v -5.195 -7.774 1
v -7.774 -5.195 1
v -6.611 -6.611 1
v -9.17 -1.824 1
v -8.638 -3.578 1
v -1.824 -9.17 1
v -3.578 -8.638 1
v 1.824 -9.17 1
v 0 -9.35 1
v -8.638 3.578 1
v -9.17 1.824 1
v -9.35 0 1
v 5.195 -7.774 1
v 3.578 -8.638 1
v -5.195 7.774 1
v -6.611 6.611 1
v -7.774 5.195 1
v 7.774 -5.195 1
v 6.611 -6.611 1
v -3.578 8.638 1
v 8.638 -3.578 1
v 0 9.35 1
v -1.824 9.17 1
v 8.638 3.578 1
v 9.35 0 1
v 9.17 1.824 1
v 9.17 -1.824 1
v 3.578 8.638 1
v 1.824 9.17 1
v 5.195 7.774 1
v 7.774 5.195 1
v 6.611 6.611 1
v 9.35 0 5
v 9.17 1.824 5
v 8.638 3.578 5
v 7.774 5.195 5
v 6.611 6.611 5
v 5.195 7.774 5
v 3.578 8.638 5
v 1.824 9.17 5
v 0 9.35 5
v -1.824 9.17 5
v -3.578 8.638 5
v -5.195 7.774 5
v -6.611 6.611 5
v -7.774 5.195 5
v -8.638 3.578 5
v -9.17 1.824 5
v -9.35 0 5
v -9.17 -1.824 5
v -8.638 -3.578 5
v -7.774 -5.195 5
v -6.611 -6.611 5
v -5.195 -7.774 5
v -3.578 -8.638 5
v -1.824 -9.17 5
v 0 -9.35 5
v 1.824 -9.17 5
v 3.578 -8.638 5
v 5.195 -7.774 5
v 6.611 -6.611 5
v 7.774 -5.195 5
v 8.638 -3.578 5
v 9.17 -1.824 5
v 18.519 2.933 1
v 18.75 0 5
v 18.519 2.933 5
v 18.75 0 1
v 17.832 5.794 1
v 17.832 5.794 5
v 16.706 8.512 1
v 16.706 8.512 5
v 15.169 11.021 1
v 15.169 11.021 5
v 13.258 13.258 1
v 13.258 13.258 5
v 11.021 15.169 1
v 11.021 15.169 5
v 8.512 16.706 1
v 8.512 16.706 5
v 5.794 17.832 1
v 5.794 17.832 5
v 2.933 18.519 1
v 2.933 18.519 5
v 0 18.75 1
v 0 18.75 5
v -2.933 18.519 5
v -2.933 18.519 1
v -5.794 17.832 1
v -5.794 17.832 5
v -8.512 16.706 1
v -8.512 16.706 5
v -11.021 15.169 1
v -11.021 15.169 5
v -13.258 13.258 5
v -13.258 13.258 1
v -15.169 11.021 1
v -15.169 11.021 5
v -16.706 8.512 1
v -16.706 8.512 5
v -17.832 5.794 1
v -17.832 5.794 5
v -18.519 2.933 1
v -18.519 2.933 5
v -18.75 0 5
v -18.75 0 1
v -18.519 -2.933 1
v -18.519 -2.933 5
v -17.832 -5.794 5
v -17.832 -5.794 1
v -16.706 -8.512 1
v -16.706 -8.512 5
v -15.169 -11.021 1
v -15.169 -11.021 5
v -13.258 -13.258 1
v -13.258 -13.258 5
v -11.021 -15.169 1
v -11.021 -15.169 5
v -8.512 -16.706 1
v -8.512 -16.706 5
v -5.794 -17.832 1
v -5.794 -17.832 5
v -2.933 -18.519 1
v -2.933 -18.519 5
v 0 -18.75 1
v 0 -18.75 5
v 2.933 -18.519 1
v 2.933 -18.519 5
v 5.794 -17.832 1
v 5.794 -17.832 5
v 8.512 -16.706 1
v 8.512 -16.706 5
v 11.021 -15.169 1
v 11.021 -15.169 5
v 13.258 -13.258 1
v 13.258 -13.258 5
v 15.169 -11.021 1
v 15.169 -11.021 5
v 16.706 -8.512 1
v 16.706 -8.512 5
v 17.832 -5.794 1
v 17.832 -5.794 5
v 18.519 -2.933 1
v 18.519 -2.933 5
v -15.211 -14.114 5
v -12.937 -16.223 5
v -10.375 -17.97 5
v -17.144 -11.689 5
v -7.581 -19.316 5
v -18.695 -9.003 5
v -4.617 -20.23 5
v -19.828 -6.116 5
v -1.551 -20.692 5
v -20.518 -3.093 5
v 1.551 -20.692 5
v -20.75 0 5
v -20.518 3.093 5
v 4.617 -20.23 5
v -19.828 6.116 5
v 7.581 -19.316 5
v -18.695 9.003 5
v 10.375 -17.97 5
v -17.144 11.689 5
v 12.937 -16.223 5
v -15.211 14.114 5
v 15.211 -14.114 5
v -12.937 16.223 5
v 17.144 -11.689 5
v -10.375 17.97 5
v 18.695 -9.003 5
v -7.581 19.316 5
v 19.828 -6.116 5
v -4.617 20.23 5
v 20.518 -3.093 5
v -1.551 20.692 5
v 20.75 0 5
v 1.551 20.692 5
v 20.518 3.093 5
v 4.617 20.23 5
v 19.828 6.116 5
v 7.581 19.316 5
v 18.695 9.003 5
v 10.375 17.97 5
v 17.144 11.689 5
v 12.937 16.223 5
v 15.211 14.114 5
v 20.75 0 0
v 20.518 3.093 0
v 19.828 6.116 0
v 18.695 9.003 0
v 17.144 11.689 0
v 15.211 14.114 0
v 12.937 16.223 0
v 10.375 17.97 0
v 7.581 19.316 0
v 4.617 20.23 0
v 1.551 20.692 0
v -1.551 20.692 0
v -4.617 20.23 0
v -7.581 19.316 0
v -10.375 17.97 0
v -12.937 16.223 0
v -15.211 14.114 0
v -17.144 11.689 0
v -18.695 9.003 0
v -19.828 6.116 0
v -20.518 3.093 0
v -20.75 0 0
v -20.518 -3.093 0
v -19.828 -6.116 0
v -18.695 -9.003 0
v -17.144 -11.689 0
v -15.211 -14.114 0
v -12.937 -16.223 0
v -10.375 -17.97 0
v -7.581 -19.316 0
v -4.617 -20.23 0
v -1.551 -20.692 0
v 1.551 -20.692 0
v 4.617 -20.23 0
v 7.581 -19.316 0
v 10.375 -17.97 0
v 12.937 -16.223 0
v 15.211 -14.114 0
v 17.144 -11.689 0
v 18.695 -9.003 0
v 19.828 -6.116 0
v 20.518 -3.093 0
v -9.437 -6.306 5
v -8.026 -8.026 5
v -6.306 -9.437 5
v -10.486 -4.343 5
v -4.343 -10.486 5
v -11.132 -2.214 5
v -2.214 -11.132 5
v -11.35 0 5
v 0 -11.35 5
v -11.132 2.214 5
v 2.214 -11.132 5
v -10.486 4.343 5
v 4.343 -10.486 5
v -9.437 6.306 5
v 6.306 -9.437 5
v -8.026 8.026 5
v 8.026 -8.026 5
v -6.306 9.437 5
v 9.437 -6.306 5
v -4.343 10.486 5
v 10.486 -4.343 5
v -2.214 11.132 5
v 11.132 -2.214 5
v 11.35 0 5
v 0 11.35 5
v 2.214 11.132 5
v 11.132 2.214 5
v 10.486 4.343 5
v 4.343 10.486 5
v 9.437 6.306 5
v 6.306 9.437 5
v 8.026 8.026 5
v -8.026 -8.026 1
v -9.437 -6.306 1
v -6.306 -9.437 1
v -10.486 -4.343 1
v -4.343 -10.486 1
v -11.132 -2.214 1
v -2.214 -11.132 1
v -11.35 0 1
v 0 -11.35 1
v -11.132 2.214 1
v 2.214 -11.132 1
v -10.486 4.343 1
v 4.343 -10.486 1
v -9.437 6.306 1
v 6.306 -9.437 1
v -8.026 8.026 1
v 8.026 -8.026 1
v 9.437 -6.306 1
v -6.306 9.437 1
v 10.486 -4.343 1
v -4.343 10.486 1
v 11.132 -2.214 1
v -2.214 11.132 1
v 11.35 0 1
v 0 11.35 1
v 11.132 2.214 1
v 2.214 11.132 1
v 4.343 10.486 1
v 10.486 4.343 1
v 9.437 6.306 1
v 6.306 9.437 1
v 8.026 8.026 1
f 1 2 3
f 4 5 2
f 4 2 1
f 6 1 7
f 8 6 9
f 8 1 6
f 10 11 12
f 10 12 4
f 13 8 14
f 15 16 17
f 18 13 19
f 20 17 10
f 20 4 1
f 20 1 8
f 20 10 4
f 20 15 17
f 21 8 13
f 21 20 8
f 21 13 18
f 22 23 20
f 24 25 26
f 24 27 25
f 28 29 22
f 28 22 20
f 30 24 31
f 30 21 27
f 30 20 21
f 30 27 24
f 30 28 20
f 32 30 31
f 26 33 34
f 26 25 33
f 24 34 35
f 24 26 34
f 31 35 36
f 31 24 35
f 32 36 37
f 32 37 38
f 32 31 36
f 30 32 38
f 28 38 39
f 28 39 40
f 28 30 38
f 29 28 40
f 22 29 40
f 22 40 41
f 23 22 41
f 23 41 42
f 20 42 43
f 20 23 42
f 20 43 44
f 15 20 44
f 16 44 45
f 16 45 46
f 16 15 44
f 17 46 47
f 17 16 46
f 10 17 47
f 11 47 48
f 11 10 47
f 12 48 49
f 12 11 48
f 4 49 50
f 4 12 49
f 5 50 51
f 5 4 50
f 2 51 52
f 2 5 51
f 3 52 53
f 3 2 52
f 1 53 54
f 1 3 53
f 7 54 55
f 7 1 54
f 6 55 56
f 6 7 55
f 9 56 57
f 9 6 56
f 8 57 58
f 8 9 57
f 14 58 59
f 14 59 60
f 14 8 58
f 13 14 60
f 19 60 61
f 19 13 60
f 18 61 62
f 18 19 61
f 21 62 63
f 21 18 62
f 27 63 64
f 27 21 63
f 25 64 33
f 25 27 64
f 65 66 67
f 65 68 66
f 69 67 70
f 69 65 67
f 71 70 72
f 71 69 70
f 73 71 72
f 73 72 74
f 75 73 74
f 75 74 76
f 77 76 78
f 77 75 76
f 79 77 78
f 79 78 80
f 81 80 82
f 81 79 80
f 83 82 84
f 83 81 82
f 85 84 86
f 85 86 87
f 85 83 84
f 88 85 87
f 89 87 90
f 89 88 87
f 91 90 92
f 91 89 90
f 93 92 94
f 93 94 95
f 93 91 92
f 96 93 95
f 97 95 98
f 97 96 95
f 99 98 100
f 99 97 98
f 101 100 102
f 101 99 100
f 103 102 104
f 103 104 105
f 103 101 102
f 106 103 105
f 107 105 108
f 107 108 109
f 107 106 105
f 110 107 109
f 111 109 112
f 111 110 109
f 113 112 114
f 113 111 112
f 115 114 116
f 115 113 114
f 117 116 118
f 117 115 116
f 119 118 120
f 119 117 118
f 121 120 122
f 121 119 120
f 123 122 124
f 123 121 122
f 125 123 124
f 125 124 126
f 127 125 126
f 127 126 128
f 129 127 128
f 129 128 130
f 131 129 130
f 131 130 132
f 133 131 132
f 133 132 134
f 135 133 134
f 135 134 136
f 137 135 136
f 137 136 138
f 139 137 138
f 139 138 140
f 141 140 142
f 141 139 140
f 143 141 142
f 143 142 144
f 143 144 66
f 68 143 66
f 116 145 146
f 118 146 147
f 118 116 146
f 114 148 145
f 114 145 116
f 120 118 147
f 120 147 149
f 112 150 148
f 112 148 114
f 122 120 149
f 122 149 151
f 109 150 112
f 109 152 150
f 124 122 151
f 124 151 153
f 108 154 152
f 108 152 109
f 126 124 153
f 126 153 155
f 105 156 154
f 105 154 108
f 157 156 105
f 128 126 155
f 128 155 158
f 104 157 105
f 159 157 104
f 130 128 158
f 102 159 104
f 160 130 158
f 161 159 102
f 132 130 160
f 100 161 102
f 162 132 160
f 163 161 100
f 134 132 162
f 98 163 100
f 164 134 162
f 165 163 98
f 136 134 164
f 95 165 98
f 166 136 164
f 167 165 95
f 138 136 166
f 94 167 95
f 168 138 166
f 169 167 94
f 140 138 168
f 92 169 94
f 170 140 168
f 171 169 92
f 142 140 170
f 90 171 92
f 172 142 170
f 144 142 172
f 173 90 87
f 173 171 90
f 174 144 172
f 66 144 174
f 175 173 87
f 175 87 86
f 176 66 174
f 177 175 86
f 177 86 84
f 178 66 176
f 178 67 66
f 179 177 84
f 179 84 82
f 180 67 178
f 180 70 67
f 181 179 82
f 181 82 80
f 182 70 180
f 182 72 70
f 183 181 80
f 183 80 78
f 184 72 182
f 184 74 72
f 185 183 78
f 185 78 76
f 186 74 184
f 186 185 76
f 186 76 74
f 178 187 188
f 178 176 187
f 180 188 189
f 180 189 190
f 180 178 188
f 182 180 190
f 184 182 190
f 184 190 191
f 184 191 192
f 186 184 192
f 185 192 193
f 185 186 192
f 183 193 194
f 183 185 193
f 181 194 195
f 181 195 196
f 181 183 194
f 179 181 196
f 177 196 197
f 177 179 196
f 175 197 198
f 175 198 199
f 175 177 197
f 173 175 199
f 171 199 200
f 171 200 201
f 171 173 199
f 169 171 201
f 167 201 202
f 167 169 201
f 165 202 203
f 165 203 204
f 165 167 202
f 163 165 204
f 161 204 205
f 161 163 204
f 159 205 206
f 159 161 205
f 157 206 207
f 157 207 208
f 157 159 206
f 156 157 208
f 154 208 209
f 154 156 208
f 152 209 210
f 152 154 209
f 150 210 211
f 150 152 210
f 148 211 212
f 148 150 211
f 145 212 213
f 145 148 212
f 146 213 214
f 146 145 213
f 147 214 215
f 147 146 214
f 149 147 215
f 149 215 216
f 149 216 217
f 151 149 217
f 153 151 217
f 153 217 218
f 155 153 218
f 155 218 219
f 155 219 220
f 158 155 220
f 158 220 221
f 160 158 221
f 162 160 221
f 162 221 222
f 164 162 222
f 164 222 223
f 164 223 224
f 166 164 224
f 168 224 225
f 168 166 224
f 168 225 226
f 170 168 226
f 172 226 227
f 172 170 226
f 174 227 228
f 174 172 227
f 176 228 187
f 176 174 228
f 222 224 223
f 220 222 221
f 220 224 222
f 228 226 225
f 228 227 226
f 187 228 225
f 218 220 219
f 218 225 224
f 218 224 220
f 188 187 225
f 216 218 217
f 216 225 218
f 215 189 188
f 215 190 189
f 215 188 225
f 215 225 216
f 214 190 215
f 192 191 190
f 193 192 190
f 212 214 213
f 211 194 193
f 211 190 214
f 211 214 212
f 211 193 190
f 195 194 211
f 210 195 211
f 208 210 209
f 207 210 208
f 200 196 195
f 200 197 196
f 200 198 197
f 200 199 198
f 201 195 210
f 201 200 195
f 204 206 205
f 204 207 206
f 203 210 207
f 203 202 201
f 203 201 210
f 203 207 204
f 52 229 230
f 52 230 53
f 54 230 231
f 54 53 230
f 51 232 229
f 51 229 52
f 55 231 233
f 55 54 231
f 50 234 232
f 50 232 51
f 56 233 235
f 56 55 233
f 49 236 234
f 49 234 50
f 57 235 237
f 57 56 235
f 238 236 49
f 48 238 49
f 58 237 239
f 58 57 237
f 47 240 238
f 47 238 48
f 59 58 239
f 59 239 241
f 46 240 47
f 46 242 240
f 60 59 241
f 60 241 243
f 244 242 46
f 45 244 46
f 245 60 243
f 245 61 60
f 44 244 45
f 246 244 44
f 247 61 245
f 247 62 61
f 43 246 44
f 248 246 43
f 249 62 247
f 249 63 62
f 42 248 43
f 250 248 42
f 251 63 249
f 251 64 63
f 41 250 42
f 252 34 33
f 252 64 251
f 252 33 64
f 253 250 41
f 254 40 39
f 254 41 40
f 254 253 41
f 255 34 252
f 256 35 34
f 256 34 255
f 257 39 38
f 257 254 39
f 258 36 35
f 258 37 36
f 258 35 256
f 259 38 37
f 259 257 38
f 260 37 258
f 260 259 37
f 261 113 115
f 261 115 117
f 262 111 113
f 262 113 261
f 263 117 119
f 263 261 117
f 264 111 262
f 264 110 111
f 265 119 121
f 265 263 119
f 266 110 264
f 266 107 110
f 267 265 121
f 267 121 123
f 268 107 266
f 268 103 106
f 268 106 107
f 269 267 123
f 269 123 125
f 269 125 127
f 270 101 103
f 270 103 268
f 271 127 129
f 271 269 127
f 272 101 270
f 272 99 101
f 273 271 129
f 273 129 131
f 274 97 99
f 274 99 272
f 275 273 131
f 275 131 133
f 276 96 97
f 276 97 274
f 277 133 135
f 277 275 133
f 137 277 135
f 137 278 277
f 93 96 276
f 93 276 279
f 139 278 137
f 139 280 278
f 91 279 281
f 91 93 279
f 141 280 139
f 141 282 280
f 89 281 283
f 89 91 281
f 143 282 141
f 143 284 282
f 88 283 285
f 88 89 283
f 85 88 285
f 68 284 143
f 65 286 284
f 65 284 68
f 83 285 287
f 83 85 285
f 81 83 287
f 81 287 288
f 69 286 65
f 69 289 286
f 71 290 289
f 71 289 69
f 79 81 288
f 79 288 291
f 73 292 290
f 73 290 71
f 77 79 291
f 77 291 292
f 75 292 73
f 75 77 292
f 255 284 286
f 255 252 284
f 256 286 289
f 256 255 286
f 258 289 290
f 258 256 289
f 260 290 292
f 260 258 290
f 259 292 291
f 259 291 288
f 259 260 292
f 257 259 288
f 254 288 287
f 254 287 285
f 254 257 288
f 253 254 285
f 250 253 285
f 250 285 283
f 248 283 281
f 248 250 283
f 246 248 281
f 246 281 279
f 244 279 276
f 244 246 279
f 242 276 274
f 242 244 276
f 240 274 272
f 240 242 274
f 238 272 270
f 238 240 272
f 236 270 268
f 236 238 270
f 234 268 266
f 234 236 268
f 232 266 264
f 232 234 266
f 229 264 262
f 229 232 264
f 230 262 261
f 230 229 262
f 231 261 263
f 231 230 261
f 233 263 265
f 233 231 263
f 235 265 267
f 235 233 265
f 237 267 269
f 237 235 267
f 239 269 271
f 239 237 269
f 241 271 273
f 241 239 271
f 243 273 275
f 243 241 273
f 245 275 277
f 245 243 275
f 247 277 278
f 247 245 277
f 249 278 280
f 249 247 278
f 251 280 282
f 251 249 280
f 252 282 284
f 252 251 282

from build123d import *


with BuildPart() as part:
    # Sketch → Revolution (revolve)
    with BuildSketch(Plane.XZ):
        Polygon((0, 0), (20.75, 0), (20.75, 5), (18.75, 5), (18.75, 1), (11.35, 1), (11.35, 5), (9.35, 5), (9.35, 1), (0, 1), align=None)
    revolve(axis=Axis((0, 0, 0), (0, 0, 1)))


solid = part.part
